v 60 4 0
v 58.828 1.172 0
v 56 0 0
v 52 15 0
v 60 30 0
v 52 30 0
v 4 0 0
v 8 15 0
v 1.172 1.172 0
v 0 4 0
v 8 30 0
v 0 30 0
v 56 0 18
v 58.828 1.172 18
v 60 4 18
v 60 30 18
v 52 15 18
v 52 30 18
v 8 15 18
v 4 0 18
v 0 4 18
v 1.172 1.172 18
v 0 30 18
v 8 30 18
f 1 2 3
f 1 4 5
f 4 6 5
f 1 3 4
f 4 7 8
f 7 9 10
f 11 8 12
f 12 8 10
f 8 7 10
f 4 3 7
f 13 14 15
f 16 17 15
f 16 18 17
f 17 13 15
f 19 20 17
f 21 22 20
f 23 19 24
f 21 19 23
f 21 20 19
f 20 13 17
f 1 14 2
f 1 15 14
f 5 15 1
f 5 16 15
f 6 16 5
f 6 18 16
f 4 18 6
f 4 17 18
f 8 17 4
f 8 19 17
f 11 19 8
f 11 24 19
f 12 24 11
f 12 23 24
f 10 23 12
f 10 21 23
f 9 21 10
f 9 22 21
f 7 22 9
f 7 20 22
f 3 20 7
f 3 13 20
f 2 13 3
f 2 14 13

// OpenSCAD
$fn = 32;

// ----------------------------------------------------------------------
// Heat sink frame: 60 x 30 mm frame, 8 mm walls
// ----------------------------------------------------------------------

// --- parameters (mm) ---
profile_height = 18;      // extrusion height
profile_points = 12;      // points of the closed outline

profile = [[0, 4], [1.172, 1.172], [4, 0], [56, 0], [58.828, 1.172], [60, 4], [60, 30], [52, 30], [52, 15], [8, 15], [8, 30], [0, 30]];  // single closed polygon, 12 points, counter clockwise

// --- the one profile operation ---
linear_extrude(height = profile_height) polygon(points = profile);
